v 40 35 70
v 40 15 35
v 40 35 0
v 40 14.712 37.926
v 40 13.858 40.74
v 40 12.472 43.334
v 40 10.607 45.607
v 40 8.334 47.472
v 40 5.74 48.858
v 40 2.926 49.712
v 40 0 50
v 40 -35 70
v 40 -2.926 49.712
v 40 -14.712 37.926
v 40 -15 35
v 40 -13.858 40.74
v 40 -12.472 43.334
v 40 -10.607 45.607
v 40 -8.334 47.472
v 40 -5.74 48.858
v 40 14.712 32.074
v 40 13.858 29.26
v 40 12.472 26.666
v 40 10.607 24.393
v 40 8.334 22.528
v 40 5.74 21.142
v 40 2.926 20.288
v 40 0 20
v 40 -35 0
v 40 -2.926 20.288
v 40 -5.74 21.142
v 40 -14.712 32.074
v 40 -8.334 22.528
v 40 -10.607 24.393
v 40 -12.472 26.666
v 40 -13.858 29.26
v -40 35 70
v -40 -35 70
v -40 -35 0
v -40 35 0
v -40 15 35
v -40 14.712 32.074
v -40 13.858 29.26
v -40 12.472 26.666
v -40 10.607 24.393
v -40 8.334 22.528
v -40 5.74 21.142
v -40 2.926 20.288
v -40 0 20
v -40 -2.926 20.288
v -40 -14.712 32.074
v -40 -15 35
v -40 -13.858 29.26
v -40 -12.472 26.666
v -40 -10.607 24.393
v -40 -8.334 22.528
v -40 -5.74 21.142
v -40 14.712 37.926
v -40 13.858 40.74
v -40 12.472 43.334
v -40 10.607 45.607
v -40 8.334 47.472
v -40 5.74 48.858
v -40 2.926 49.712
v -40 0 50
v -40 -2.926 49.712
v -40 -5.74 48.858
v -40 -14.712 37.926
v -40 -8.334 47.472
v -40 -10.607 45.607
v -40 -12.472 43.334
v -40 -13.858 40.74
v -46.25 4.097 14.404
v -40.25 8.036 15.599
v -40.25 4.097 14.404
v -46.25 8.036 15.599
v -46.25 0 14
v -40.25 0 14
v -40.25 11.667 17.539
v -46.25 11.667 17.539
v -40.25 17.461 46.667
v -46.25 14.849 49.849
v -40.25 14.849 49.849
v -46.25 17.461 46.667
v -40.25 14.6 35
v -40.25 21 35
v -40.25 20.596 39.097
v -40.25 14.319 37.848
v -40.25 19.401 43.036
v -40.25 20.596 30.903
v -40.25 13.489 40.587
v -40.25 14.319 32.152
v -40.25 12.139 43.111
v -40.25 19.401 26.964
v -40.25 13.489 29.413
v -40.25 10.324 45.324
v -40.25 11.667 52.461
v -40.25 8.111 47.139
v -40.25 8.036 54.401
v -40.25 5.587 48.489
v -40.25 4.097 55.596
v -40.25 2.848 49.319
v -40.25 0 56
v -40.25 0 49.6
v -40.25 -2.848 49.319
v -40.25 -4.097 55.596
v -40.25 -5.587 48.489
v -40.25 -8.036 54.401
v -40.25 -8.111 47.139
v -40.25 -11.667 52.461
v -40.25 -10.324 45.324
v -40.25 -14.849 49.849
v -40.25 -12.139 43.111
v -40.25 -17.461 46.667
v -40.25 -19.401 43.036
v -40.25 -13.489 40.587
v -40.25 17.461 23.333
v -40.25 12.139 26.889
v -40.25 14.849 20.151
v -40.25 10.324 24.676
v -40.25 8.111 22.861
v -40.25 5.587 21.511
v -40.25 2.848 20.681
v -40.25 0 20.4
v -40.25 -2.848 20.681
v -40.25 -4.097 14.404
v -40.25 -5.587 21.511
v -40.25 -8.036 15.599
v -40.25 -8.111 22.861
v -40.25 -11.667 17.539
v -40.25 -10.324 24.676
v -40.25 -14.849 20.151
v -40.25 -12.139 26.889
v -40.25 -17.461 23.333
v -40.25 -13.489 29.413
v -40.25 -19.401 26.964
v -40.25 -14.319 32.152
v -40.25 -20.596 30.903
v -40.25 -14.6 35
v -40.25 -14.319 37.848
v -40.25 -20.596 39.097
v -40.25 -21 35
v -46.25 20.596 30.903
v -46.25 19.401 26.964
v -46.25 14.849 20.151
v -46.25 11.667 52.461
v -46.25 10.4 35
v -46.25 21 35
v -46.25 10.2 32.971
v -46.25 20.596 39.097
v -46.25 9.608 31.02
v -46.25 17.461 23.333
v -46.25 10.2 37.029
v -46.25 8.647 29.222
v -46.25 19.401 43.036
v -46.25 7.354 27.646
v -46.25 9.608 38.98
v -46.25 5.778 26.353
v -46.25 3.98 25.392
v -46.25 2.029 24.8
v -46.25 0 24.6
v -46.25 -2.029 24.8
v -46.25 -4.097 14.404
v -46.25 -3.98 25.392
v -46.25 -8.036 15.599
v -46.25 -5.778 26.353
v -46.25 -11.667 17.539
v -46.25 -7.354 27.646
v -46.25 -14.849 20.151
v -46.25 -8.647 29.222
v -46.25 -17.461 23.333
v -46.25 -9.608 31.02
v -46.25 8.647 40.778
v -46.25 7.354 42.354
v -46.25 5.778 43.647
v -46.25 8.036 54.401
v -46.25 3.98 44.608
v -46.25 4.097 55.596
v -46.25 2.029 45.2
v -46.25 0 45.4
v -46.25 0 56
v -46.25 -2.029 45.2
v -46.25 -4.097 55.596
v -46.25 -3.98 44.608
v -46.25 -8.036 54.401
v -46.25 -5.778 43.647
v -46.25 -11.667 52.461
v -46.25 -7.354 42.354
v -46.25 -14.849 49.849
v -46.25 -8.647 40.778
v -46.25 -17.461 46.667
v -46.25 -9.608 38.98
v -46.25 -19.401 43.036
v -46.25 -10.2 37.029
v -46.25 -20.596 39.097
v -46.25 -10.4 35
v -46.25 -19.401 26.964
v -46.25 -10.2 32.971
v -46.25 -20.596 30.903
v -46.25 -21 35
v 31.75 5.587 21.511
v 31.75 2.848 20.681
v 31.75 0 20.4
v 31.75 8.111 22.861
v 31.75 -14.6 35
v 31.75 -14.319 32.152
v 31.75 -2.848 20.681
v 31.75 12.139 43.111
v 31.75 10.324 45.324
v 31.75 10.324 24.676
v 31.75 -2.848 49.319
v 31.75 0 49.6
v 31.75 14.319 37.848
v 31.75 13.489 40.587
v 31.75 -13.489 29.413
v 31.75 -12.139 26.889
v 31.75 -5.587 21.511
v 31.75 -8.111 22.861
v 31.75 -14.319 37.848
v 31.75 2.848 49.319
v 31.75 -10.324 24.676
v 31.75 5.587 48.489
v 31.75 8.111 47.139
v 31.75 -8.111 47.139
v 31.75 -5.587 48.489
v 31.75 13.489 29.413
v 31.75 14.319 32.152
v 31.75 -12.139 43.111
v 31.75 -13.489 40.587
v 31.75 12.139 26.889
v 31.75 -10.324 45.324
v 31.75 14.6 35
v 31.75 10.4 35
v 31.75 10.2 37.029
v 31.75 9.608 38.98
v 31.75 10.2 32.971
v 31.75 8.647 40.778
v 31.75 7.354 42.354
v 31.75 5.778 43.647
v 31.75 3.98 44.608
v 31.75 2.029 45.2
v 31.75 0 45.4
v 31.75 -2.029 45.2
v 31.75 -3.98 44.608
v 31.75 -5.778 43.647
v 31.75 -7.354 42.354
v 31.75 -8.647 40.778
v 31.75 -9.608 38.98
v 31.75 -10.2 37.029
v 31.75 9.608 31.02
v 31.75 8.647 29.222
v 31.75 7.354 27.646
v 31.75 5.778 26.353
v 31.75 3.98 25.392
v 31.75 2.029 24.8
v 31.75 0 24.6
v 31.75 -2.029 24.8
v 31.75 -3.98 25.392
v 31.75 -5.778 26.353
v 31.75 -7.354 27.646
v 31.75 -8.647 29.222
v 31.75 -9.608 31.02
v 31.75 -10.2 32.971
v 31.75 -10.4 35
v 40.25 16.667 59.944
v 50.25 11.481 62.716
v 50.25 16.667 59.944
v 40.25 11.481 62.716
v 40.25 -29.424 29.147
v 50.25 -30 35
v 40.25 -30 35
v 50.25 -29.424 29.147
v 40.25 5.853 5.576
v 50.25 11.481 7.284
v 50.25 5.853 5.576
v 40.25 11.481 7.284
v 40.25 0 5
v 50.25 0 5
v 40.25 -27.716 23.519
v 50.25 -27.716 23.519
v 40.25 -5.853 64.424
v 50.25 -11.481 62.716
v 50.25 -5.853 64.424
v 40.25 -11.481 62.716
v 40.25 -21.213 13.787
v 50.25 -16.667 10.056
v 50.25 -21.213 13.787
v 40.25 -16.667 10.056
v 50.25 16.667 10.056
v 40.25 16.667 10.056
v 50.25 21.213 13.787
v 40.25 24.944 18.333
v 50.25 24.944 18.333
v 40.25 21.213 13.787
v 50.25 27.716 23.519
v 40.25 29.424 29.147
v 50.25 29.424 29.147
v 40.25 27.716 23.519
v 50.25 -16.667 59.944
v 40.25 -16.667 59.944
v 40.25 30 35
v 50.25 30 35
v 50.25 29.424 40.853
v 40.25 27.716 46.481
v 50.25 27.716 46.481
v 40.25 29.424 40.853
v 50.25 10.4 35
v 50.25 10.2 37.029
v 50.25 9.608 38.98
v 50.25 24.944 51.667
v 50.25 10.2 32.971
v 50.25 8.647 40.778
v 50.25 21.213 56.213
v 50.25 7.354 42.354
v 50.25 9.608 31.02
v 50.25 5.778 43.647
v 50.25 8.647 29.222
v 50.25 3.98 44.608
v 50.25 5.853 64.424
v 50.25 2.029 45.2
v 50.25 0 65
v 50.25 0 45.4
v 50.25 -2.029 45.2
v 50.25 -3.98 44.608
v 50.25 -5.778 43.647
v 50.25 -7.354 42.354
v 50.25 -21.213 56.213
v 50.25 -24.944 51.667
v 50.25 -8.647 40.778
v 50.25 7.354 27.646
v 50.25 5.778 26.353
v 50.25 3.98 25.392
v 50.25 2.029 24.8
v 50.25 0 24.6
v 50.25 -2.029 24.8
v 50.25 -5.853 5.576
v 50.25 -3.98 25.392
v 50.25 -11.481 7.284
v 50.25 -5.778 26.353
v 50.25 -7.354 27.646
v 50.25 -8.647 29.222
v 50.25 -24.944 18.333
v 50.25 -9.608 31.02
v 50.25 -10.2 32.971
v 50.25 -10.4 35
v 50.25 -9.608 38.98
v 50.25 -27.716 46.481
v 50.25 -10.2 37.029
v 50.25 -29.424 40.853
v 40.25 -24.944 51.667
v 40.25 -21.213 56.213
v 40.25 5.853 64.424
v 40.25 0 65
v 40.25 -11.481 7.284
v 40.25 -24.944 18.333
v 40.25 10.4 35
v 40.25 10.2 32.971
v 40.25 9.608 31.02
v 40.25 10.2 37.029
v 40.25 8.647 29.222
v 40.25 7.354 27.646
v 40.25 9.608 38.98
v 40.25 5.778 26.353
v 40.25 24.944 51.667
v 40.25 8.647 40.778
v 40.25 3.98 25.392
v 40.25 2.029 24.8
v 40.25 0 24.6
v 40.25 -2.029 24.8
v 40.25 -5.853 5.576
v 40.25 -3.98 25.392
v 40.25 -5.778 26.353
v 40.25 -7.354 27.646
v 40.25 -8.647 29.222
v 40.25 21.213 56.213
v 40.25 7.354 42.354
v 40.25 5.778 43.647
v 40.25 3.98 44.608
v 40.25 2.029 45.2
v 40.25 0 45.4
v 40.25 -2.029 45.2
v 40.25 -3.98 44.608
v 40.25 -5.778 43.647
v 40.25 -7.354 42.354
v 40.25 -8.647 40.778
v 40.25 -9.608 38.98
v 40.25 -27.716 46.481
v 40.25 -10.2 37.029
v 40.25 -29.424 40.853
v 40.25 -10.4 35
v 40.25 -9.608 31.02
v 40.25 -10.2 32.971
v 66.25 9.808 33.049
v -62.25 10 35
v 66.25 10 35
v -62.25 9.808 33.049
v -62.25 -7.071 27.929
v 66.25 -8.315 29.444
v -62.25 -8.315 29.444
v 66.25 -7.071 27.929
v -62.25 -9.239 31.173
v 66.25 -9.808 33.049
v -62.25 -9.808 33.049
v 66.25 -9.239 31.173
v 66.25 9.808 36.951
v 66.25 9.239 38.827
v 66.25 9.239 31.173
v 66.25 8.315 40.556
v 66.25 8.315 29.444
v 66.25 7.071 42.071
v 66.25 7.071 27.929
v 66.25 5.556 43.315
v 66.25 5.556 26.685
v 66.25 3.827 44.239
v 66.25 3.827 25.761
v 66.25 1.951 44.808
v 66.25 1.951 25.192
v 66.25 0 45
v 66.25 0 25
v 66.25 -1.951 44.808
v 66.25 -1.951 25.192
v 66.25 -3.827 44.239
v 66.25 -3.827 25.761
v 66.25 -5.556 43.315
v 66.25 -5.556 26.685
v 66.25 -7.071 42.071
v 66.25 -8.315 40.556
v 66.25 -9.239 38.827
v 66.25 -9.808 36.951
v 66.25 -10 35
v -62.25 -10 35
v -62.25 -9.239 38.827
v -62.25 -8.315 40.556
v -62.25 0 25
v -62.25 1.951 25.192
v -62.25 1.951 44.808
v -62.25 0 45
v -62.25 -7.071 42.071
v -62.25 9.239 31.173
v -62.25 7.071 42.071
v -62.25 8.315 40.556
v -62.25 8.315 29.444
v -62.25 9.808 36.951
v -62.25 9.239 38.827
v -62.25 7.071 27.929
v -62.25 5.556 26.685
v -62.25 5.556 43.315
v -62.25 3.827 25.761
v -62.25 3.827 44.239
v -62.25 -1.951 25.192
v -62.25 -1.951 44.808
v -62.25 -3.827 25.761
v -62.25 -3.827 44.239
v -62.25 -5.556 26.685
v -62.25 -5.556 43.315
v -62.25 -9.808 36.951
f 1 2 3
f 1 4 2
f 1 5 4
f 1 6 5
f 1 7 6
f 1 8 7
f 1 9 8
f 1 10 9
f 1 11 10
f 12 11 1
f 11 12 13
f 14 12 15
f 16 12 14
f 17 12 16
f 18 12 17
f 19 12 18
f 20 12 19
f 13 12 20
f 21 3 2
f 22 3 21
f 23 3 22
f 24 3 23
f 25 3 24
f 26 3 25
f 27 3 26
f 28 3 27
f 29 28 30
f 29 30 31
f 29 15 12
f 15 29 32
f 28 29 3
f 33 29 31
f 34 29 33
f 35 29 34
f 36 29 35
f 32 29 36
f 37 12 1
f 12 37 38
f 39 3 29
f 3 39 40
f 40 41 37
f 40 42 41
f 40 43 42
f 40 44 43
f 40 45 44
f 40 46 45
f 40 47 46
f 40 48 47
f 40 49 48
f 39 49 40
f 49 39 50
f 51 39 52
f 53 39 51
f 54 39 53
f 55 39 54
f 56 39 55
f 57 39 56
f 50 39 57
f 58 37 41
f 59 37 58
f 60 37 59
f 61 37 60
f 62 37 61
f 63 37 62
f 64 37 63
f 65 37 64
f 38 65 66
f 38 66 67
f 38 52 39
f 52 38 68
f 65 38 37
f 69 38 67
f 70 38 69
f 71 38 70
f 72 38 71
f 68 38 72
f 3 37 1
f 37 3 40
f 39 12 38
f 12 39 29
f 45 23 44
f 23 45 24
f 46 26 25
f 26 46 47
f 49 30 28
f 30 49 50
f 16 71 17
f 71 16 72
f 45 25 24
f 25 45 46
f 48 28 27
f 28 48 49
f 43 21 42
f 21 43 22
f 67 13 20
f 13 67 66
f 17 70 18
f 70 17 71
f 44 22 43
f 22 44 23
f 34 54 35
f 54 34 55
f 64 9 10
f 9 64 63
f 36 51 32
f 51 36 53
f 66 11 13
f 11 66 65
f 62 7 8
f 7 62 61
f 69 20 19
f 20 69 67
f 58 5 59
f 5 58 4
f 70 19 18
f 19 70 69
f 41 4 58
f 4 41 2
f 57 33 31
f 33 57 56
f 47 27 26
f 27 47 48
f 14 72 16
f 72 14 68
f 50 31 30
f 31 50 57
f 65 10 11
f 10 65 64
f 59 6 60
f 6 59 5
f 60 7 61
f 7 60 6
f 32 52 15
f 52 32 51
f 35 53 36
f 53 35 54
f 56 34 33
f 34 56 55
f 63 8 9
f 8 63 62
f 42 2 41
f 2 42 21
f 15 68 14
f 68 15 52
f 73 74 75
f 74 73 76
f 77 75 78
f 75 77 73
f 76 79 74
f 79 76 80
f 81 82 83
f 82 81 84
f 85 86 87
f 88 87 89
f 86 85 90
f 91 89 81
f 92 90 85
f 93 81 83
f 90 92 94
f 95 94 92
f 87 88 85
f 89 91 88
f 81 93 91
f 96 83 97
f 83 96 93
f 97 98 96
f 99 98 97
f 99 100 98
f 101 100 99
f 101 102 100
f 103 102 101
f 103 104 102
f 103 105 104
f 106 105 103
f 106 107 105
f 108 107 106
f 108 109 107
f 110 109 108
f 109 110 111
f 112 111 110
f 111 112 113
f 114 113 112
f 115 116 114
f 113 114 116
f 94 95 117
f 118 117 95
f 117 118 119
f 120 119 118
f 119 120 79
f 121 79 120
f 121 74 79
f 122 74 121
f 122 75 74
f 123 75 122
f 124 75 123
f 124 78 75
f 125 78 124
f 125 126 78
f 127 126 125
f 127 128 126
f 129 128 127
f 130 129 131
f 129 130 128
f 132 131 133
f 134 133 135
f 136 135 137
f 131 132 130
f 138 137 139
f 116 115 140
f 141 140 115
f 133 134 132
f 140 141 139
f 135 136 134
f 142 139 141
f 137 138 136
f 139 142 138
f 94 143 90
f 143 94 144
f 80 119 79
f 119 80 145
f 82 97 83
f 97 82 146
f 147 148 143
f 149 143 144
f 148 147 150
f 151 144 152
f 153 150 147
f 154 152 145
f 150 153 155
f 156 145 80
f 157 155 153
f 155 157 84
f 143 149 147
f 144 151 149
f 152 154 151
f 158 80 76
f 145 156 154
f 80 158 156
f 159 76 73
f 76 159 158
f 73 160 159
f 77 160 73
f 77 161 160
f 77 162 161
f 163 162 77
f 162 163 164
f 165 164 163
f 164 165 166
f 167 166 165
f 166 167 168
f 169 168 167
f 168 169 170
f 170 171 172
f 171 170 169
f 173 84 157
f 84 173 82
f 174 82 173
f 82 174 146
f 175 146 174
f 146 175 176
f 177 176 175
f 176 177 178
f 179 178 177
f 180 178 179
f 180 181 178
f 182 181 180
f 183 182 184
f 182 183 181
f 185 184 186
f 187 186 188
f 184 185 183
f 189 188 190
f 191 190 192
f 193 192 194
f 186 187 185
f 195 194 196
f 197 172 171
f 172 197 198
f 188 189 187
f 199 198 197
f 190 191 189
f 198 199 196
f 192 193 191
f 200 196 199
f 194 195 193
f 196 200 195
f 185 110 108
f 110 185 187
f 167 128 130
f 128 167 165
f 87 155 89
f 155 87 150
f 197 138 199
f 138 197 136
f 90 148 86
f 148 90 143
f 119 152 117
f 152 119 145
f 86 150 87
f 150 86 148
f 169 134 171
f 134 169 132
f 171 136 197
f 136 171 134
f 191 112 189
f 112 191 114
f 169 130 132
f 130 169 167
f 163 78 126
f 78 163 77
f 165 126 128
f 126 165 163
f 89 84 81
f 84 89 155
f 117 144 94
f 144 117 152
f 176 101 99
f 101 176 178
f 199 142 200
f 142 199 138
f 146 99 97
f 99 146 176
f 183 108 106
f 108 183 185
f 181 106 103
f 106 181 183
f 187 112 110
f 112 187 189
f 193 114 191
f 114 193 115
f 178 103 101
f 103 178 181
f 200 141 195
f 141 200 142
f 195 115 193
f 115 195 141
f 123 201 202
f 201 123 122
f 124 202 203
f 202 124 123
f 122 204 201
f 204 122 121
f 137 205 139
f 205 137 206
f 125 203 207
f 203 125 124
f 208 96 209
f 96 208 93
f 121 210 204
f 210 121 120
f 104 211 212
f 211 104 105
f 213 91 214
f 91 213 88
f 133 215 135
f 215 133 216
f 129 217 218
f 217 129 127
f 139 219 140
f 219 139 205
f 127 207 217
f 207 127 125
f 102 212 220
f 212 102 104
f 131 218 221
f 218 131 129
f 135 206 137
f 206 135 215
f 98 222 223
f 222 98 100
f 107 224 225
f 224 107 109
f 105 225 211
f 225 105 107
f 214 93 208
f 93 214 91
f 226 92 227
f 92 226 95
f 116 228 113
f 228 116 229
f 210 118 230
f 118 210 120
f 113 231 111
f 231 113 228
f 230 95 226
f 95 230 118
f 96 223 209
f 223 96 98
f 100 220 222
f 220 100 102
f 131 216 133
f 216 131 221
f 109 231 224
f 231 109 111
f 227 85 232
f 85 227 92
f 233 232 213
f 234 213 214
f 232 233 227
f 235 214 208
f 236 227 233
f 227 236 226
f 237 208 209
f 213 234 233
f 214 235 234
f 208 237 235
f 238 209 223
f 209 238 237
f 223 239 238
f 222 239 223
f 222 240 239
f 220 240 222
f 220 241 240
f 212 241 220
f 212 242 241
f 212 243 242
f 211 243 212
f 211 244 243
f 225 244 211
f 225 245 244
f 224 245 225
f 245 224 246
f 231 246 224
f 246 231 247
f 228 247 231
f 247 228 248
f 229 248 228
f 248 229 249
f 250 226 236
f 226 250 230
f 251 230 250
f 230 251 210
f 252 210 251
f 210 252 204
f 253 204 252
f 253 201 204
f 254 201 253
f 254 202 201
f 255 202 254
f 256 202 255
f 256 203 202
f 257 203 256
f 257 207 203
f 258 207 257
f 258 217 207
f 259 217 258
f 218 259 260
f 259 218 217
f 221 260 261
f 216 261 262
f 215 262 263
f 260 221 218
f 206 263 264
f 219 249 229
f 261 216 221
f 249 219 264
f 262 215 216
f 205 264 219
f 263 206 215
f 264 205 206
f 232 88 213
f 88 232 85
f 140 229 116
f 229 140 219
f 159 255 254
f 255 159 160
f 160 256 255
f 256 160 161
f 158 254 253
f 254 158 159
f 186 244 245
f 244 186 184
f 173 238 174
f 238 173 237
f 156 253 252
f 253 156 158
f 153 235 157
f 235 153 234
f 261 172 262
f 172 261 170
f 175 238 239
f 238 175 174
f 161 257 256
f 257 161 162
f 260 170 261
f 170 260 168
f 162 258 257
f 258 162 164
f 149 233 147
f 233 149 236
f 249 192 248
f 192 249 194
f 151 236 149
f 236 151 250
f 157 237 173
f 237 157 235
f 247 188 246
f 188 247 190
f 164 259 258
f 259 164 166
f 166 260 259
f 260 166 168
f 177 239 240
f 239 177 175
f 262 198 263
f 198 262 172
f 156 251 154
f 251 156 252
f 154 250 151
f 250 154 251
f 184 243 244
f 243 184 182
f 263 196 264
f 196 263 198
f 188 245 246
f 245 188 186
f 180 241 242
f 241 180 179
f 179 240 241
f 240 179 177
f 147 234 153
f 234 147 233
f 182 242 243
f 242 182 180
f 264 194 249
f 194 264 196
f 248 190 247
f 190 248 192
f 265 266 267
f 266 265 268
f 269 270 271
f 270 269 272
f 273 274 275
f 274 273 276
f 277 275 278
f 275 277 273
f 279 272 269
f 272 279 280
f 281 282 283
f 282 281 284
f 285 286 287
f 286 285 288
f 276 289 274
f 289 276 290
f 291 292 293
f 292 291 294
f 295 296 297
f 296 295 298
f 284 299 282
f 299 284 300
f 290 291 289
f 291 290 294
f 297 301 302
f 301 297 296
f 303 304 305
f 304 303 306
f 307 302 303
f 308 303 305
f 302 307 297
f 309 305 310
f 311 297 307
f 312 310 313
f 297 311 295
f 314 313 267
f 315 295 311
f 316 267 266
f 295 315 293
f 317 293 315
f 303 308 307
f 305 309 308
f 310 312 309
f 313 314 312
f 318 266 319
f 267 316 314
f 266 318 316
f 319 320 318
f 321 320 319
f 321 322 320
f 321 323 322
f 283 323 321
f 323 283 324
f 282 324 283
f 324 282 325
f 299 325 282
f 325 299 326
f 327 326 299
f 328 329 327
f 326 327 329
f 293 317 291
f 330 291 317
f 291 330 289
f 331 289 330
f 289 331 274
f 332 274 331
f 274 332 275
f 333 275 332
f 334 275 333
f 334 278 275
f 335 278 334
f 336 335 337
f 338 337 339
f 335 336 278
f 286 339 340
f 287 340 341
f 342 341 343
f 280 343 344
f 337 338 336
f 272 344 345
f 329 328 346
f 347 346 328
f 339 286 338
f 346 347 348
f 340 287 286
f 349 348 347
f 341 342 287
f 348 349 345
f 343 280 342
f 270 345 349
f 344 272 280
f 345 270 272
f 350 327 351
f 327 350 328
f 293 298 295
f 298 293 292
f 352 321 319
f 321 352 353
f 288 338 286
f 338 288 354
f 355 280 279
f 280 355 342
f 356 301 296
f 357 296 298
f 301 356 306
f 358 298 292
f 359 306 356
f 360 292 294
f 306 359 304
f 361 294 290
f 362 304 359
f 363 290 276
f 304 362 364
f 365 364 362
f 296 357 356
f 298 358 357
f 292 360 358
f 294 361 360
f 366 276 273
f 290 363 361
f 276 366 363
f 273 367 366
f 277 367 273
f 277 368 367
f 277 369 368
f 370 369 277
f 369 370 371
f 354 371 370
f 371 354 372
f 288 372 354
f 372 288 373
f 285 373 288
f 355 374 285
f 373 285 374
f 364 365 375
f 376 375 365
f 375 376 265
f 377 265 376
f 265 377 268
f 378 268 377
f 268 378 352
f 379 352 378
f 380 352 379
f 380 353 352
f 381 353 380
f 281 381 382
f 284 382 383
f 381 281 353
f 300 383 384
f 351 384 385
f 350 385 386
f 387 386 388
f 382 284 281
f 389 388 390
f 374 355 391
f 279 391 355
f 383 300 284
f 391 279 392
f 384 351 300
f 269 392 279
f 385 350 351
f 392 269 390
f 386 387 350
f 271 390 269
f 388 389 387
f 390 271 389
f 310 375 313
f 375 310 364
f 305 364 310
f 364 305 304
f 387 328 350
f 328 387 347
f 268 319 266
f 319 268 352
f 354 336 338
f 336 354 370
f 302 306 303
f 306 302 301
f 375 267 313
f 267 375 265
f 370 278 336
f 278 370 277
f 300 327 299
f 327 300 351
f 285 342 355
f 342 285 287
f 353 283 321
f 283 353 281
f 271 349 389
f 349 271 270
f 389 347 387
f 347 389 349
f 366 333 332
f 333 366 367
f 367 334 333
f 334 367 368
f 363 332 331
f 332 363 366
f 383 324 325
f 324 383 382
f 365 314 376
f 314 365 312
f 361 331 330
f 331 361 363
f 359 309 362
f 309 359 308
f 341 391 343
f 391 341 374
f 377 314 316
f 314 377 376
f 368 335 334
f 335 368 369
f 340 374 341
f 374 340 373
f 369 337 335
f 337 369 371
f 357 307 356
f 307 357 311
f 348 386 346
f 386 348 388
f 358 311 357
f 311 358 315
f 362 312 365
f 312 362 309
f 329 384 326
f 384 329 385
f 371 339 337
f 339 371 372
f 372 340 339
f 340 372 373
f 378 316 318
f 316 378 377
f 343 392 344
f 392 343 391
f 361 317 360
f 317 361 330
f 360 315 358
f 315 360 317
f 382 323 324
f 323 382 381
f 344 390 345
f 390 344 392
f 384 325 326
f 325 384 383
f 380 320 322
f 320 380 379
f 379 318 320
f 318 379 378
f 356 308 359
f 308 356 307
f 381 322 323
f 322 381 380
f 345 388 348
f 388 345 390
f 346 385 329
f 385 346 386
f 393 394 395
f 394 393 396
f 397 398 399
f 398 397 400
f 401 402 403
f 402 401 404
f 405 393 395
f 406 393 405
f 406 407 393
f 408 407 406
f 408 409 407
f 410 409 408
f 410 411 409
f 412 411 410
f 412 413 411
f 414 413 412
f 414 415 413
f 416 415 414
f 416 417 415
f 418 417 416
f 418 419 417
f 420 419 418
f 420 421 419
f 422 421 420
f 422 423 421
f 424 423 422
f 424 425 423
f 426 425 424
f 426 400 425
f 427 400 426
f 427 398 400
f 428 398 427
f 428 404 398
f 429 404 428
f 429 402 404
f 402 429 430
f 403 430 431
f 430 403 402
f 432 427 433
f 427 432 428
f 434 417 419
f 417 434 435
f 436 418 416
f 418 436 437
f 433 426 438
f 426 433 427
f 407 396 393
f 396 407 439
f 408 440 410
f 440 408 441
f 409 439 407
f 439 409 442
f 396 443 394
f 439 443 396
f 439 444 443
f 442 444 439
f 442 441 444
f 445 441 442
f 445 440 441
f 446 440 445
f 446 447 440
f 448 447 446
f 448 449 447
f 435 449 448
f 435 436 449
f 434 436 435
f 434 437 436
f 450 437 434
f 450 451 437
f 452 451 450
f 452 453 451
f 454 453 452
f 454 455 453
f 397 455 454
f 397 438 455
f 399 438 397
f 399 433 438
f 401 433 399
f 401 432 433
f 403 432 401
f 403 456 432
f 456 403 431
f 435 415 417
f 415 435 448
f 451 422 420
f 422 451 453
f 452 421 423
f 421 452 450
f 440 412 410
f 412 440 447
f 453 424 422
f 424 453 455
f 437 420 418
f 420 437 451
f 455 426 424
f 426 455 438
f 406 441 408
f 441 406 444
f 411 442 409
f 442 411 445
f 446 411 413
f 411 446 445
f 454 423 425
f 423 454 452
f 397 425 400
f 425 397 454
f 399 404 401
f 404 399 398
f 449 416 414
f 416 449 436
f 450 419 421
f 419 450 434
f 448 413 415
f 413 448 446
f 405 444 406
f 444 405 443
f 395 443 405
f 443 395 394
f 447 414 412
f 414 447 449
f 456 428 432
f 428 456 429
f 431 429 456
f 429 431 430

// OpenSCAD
$fn = 32;

// ------------------------------------------------------------------------
// Bushed housing: 80 x 70 x 70 mm housing, bushing d29.2
// Every part is its own module, assembly() places them once.
// ------------------------------------------------------------------------

// --- part 1 ---
module housing() {
  difference() {
    translate([-40, -35, 0]) cube([80, 70, 70]);
    translate([0, 0, 35]) rotate([0, 90, 0]) cylinder(h = 82, d = 30, center = true);
  }
}

// --- part 2 ---
module bushing() {
  difference() {
    union() {
      cylinder(h = 6, d = 42);
      translate([0, 0, 6]) cylinder(h = 72, d = 29.2);
    }
    translate([0, 0, -1]) cylinder(h = 80, d = 20.8);
  }
}

// --- part 3 ---
module shaft() {
  translate([0, 0, -64.25]) cylinder(h = 128.5, d = 20);
}

// --- part 4 ---
module cover() {
  difference() {
    cylinder(h = 10, d = 60);
    translate([0, 0, -1]) cylinder(h = 12, d = 20.8);
  }
}

// --- assembly ---
module assembly() {
  translate([0, 0, 0]) rotate([0, 0, 0]) housing();
  translate([-46.25, 0, 35]) rotate([0, 90, 0]) bushing();
  translate([2, 0, 35]) rotate([0, 90, 0]) shaft();
  translate([40.25, 0, 35]) rotate([0, 90, 0]) cover();
}

assembly();
